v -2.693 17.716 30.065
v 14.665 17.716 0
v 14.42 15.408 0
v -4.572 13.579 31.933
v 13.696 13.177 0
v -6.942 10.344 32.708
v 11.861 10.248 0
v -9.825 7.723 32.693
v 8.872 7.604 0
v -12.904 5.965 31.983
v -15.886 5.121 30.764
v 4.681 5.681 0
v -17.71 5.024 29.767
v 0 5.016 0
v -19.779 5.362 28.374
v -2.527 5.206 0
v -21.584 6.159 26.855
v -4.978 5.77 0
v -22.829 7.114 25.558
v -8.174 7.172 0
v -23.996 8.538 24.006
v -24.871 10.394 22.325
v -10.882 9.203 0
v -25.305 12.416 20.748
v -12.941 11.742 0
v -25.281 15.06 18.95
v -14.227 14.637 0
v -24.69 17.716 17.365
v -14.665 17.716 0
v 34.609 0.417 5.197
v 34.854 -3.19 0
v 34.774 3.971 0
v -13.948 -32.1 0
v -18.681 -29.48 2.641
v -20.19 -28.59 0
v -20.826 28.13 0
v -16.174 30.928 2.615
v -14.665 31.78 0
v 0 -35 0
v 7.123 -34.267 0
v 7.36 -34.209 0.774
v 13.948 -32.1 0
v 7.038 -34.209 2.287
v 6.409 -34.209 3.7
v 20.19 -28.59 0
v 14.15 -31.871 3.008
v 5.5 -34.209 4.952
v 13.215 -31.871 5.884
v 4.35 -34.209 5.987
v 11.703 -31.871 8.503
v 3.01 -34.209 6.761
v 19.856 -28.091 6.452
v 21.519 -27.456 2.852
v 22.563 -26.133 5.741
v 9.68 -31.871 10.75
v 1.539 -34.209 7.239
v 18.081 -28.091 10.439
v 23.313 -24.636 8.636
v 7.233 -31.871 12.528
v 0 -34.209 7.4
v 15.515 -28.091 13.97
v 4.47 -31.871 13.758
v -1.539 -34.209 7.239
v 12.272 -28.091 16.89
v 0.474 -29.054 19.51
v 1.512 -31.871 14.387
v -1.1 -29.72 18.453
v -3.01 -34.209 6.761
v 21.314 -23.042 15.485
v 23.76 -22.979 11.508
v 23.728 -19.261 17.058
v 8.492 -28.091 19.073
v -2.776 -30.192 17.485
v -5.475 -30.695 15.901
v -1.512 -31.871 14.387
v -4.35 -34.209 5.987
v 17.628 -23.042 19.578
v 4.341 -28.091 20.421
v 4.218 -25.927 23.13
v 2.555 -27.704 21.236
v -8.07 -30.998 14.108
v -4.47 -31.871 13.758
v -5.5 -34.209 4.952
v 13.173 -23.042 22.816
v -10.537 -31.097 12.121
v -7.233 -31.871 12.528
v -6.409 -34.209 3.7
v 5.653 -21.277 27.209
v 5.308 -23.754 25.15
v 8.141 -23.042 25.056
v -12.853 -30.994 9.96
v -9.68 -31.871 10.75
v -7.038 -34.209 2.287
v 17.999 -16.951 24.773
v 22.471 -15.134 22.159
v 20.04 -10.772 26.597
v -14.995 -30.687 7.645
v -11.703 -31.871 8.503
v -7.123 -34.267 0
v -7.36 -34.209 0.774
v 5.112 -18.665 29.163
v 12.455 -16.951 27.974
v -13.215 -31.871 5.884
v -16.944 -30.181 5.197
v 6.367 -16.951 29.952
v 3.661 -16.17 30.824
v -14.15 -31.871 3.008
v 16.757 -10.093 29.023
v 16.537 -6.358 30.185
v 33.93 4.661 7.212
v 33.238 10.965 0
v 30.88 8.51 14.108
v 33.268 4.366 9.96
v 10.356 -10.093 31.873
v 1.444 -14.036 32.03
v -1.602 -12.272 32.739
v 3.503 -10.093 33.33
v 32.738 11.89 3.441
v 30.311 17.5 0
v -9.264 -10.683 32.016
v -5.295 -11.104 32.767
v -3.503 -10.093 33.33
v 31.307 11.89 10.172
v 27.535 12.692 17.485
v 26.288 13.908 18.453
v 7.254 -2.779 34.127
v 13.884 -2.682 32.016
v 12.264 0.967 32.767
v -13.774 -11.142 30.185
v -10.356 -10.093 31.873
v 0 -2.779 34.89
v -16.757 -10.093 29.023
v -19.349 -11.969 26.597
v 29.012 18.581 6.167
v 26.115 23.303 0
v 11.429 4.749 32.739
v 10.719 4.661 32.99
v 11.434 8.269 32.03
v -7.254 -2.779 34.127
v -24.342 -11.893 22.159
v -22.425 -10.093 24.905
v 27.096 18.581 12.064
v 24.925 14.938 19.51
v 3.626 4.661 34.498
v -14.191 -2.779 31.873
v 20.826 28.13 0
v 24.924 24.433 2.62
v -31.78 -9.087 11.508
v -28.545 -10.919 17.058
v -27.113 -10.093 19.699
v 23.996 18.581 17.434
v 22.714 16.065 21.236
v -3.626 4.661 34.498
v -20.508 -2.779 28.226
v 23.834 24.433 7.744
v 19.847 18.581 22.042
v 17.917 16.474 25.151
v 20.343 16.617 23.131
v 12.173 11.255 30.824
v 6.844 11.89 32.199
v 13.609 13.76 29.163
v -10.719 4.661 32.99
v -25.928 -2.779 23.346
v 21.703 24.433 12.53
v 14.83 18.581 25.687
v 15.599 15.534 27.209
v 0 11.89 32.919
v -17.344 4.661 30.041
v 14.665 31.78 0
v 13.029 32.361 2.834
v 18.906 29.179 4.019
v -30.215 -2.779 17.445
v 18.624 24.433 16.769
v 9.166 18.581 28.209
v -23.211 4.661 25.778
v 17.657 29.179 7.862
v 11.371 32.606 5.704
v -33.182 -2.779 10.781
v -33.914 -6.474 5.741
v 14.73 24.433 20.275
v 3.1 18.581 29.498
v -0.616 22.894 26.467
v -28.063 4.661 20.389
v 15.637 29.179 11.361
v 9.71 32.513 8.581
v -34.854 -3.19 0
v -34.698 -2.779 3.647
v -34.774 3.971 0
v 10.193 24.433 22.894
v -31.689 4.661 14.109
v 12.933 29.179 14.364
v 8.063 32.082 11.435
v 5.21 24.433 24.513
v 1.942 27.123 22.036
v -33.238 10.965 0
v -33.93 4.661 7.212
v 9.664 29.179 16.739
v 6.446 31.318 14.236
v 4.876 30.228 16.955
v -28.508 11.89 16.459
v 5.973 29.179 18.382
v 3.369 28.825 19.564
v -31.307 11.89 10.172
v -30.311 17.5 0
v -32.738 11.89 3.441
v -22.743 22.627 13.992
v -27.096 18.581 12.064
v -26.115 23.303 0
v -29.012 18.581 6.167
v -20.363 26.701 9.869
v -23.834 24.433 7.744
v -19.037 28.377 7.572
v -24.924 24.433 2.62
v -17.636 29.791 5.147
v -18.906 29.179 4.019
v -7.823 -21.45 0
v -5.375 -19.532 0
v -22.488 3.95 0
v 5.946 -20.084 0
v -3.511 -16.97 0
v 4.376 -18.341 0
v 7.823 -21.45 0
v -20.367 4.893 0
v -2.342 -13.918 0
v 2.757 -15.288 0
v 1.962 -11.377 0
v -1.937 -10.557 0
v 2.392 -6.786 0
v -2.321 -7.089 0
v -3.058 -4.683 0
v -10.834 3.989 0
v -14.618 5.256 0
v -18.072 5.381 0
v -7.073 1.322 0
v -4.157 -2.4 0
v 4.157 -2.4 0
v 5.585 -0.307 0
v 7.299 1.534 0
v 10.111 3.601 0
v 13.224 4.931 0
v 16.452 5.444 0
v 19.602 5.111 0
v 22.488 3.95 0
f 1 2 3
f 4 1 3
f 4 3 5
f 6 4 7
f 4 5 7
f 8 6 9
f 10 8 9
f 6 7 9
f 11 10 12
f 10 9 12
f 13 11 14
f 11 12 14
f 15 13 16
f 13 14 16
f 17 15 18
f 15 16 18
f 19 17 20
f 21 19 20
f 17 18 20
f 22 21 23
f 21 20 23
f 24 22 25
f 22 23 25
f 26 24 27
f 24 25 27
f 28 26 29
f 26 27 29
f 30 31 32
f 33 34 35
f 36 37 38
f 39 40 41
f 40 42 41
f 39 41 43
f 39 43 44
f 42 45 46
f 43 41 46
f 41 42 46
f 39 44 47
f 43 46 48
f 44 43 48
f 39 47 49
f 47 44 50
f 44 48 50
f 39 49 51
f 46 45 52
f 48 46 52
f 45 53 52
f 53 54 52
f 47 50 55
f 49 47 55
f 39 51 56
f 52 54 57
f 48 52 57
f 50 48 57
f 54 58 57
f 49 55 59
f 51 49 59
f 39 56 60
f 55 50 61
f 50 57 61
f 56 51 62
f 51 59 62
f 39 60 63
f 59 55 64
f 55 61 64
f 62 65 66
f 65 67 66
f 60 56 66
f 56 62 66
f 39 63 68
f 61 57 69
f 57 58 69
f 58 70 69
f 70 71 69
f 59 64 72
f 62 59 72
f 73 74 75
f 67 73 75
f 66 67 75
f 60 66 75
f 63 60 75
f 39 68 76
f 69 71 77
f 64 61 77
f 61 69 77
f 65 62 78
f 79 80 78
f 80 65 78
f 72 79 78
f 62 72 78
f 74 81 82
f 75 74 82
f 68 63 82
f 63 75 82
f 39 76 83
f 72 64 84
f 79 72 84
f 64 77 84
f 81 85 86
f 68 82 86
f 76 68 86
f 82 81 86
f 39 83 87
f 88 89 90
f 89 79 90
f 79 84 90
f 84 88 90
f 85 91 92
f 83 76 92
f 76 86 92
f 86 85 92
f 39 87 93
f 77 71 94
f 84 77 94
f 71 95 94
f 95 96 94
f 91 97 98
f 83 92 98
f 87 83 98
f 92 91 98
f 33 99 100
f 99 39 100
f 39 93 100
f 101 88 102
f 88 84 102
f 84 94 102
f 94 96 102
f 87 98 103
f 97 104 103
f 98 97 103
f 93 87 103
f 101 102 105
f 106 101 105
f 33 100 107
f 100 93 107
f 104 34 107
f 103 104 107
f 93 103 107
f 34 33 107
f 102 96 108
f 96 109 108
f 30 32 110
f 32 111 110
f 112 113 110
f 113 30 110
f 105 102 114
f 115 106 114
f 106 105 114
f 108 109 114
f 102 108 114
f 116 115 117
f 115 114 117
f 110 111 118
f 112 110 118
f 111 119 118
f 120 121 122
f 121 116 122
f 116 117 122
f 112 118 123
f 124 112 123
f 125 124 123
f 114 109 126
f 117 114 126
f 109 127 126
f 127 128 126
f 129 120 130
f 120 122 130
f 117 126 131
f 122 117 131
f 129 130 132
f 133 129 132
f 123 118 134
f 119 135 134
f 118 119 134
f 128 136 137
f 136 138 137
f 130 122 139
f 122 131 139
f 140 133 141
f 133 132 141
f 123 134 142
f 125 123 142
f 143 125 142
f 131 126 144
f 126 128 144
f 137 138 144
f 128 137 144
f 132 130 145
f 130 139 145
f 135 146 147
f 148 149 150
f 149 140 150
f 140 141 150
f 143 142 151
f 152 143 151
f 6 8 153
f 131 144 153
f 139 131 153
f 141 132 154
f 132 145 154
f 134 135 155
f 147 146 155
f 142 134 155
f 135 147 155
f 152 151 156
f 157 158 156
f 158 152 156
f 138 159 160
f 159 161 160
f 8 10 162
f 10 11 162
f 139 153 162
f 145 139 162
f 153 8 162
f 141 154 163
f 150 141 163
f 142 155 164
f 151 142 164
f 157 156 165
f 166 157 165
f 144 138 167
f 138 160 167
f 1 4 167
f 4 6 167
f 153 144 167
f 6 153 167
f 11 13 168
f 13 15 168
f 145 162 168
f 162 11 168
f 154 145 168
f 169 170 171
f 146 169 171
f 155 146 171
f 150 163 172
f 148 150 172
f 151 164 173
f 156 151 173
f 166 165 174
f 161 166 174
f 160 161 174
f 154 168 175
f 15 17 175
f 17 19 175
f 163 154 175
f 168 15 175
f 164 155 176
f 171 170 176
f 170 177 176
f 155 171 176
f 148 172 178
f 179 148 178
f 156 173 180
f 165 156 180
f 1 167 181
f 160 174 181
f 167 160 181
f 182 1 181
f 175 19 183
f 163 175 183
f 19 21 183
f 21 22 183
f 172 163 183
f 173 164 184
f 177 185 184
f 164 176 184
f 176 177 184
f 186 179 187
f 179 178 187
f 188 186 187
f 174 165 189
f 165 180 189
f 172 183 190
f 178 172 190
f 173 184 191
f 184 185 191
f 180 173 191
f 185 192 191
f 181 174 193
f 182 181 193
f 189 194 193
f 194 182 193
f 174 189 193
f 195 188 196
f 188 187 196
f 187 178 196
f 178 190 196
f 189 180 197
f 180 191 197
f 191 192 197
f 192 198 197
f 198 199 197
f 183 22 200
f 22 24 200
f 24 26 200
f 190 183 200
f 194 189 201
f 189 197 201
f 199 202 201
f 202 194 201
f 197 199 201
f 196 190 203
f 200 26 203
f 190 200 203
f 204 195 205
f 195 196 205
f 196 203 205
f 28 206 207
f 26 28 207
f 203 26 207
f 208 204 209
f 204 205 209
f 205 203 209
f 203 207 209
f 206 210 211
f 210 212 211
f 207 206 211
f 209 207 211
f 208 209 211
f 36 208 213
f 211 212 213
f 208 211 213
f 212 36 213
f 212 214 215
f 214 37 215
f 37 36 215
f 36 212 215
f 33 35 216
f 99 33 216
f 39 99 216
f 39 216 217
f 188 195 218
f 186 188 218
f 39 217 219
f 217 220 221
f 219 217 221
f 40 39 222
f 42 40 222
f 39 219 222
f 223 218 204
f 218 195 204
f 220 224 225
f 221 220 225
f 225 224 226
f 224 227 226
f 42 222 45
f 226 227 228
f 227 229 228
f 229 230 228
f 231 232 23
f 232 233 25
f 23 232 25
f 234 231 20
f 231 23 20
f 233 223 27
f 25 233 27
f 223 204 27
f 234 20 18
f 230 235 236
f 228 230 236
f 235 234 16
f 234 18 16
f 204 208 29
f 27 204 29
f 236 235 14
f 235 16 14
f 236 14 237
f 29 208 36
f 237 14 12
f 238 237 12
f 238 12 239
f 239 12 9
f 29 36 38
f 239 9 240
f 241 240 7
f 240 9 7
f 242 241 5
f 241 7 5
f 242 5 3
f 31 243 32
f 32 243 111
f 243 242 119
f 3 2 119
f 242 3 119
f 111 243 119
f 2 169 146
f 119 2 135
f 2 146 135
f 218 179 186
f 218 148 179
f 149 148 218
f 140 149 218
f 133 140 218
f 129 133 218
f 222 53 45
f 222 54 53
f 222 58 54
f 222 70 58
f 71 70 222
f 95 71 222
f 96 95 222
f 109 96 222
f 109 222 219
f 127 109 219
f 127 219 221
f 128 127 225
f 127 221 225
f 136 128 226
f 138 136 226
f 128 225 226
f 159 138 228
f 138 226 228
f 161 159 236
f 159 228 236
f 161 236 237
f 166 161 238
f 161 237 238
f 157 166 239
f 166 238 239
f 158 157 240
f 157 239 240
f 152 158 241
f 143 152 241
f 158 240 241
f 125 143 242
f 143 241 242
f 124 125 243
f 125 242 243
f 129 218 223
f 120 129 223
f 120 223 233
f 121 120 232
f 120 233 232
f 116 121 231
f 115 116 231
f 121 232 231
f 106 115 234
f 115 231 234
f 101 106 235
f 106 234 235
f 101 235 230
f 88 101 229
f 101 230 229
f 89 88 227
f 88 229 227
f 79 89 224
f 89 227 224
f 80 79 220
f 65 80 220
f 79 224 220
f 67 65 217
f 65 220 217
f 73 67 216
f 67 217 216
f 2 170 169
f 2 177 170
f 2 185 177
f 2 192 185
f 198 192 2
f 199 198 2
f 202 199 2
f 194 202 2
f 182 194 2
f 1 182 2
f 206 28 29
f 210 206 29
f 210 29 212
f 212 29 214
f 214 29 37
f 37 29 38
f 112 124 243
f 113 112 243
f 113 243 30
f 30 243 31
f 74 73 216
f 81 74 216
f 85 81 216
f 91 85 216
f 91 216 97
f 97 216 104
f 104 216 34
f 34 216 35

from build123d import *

# Parameters (mm, degrees)
F3_W           = 110.9925583005
F3_H           = 44.4556474686
F4_DEPTH       = 40
F4_DEPTH_BACK  = 40
F7_DEPTH       = 60
F7_DEPTH_BACK  = 25
F12_DEPTH      = 60
F12_DEPTH_BACK = 60
F16_DEPTH      = 60
F16_DEPTH_BACK = 60


with BuildPart() as f2:
    # F0 (on Top) → F2 (revolve)
    with BuildSketch(Plane.XY):
        with BuildLine():
            Line((0, 35), (0, -35))
            ThreePointArc((0, -35), (35, 0), (0, 35))
        make_face()
    revolve(axis=Axis((0, 0, 0), (0, -1, 0)))

    # F3 (on Front) → F4 (cut, two sides)
    with BuildSketch(Plane.XZ) as f4_sk:
        with Locations((0.8793435991, -22.2278237343)):
            Rectangle(F3_W, F3_H)
    extrude(amount=-F4_DEPTH, mode=Mode.SUBTRACT)
    extrude(f4_sk.sketch, amount=F4_DEPTH_BACK, mode=Mode.SUBTRACT)

    # F6 (on line) → F7 (cut, two sides)
    with BuildSketch(Plane(origin=(0, 0, 0), x_dir=(0.8660254038, 0, 0.5), z_dir=(0.5, 0, -0.8660254038))) as f7_sk:
        with BuildLine():
            Line((12.7, -40.8236384392), (12.7, -17.7161854768))
            ThreePointArc((12.7, -17.7161854768), (0, -5.0161854768), (-12.7, -17.7161854768))
            Line((-12.7, -17.7161854768), (-12.7, -40.8236384392))
            Line((-12.7, -40.8236384392), (12.7, -40.8236384392))
        make_face()
    extrude(amount=-F7_DEPTH, mode=Mode.SUBTRACT)
    extrude(f7_sk.sketch, amount=F7_DEPTH_BACK, mode=Mode.SUBTRACT)

    # F11 (on line) → F12 (cut, two sides)
    with BuildSketch(Plane(origin=(0, 0, 0), x_dir=(0.9682458366, 0.1118033989, -0.2236067977), z_dir=(-0.25, 0.4330127019, -0.8660254038))) as f12_sk:
        with BuildLine():
            Line((-36.9845643478, 4.2932505168), (-21.3320885053, -3.5329874044))
            ThreePointArc((-21.3320885053, -3.5329874044), (-4.2932505168, 2.1466252584), (-9.9728631796, 19.1854632469))
            Line((-9.9728631796, 19.1854632469), (-25.6253390221, 27.0117011682))
            Line((-25.6253390221, 27.0117011682), (-36.9845643478, 4.2932505168))
        make_face()
    extrude(amount=-F12_DEPTH, mode=Mode.SUBTRACT)
    extrude(f12_sk.sketch, amount=F12_DEPTH_BACK, mode=Mode.SUBTRACT)

    # F15 (on line) → F16 (cut, two sides)
    with BuildSketch(Plane(origin=(0, 0, 0), x_dir=(0.9682458366, -0.1118033989, -0.2236067977), z_dir=(-0.25, -0.4330127019, -0.8660254038))) as f16_sk:
        with BuildLine():
            Line((25.6253390221, 27.0117011682), (9.9728631796, 19.1854632469))
            ThreePointArc((9.9728631796, 19.1854632469), (4.2932505168, 2.1466252584), (21.3320885053, -3.5329874044))
            Line((21.3320885053, -3.5329874044), (36.9845643478, 4.2932505168))
            Line((36.9845643478, 4.2932505168), (25.6253390221, 27.0117011682))
        make_face()
    extrude(amount=-F16_DEPTH, mode=Mode.SUBTRACT)
    extrude(f16_sk.sketch, amount=F16_DEPTH_BACK, mode=Mode.SUBTRACT)


solid = f2.part
